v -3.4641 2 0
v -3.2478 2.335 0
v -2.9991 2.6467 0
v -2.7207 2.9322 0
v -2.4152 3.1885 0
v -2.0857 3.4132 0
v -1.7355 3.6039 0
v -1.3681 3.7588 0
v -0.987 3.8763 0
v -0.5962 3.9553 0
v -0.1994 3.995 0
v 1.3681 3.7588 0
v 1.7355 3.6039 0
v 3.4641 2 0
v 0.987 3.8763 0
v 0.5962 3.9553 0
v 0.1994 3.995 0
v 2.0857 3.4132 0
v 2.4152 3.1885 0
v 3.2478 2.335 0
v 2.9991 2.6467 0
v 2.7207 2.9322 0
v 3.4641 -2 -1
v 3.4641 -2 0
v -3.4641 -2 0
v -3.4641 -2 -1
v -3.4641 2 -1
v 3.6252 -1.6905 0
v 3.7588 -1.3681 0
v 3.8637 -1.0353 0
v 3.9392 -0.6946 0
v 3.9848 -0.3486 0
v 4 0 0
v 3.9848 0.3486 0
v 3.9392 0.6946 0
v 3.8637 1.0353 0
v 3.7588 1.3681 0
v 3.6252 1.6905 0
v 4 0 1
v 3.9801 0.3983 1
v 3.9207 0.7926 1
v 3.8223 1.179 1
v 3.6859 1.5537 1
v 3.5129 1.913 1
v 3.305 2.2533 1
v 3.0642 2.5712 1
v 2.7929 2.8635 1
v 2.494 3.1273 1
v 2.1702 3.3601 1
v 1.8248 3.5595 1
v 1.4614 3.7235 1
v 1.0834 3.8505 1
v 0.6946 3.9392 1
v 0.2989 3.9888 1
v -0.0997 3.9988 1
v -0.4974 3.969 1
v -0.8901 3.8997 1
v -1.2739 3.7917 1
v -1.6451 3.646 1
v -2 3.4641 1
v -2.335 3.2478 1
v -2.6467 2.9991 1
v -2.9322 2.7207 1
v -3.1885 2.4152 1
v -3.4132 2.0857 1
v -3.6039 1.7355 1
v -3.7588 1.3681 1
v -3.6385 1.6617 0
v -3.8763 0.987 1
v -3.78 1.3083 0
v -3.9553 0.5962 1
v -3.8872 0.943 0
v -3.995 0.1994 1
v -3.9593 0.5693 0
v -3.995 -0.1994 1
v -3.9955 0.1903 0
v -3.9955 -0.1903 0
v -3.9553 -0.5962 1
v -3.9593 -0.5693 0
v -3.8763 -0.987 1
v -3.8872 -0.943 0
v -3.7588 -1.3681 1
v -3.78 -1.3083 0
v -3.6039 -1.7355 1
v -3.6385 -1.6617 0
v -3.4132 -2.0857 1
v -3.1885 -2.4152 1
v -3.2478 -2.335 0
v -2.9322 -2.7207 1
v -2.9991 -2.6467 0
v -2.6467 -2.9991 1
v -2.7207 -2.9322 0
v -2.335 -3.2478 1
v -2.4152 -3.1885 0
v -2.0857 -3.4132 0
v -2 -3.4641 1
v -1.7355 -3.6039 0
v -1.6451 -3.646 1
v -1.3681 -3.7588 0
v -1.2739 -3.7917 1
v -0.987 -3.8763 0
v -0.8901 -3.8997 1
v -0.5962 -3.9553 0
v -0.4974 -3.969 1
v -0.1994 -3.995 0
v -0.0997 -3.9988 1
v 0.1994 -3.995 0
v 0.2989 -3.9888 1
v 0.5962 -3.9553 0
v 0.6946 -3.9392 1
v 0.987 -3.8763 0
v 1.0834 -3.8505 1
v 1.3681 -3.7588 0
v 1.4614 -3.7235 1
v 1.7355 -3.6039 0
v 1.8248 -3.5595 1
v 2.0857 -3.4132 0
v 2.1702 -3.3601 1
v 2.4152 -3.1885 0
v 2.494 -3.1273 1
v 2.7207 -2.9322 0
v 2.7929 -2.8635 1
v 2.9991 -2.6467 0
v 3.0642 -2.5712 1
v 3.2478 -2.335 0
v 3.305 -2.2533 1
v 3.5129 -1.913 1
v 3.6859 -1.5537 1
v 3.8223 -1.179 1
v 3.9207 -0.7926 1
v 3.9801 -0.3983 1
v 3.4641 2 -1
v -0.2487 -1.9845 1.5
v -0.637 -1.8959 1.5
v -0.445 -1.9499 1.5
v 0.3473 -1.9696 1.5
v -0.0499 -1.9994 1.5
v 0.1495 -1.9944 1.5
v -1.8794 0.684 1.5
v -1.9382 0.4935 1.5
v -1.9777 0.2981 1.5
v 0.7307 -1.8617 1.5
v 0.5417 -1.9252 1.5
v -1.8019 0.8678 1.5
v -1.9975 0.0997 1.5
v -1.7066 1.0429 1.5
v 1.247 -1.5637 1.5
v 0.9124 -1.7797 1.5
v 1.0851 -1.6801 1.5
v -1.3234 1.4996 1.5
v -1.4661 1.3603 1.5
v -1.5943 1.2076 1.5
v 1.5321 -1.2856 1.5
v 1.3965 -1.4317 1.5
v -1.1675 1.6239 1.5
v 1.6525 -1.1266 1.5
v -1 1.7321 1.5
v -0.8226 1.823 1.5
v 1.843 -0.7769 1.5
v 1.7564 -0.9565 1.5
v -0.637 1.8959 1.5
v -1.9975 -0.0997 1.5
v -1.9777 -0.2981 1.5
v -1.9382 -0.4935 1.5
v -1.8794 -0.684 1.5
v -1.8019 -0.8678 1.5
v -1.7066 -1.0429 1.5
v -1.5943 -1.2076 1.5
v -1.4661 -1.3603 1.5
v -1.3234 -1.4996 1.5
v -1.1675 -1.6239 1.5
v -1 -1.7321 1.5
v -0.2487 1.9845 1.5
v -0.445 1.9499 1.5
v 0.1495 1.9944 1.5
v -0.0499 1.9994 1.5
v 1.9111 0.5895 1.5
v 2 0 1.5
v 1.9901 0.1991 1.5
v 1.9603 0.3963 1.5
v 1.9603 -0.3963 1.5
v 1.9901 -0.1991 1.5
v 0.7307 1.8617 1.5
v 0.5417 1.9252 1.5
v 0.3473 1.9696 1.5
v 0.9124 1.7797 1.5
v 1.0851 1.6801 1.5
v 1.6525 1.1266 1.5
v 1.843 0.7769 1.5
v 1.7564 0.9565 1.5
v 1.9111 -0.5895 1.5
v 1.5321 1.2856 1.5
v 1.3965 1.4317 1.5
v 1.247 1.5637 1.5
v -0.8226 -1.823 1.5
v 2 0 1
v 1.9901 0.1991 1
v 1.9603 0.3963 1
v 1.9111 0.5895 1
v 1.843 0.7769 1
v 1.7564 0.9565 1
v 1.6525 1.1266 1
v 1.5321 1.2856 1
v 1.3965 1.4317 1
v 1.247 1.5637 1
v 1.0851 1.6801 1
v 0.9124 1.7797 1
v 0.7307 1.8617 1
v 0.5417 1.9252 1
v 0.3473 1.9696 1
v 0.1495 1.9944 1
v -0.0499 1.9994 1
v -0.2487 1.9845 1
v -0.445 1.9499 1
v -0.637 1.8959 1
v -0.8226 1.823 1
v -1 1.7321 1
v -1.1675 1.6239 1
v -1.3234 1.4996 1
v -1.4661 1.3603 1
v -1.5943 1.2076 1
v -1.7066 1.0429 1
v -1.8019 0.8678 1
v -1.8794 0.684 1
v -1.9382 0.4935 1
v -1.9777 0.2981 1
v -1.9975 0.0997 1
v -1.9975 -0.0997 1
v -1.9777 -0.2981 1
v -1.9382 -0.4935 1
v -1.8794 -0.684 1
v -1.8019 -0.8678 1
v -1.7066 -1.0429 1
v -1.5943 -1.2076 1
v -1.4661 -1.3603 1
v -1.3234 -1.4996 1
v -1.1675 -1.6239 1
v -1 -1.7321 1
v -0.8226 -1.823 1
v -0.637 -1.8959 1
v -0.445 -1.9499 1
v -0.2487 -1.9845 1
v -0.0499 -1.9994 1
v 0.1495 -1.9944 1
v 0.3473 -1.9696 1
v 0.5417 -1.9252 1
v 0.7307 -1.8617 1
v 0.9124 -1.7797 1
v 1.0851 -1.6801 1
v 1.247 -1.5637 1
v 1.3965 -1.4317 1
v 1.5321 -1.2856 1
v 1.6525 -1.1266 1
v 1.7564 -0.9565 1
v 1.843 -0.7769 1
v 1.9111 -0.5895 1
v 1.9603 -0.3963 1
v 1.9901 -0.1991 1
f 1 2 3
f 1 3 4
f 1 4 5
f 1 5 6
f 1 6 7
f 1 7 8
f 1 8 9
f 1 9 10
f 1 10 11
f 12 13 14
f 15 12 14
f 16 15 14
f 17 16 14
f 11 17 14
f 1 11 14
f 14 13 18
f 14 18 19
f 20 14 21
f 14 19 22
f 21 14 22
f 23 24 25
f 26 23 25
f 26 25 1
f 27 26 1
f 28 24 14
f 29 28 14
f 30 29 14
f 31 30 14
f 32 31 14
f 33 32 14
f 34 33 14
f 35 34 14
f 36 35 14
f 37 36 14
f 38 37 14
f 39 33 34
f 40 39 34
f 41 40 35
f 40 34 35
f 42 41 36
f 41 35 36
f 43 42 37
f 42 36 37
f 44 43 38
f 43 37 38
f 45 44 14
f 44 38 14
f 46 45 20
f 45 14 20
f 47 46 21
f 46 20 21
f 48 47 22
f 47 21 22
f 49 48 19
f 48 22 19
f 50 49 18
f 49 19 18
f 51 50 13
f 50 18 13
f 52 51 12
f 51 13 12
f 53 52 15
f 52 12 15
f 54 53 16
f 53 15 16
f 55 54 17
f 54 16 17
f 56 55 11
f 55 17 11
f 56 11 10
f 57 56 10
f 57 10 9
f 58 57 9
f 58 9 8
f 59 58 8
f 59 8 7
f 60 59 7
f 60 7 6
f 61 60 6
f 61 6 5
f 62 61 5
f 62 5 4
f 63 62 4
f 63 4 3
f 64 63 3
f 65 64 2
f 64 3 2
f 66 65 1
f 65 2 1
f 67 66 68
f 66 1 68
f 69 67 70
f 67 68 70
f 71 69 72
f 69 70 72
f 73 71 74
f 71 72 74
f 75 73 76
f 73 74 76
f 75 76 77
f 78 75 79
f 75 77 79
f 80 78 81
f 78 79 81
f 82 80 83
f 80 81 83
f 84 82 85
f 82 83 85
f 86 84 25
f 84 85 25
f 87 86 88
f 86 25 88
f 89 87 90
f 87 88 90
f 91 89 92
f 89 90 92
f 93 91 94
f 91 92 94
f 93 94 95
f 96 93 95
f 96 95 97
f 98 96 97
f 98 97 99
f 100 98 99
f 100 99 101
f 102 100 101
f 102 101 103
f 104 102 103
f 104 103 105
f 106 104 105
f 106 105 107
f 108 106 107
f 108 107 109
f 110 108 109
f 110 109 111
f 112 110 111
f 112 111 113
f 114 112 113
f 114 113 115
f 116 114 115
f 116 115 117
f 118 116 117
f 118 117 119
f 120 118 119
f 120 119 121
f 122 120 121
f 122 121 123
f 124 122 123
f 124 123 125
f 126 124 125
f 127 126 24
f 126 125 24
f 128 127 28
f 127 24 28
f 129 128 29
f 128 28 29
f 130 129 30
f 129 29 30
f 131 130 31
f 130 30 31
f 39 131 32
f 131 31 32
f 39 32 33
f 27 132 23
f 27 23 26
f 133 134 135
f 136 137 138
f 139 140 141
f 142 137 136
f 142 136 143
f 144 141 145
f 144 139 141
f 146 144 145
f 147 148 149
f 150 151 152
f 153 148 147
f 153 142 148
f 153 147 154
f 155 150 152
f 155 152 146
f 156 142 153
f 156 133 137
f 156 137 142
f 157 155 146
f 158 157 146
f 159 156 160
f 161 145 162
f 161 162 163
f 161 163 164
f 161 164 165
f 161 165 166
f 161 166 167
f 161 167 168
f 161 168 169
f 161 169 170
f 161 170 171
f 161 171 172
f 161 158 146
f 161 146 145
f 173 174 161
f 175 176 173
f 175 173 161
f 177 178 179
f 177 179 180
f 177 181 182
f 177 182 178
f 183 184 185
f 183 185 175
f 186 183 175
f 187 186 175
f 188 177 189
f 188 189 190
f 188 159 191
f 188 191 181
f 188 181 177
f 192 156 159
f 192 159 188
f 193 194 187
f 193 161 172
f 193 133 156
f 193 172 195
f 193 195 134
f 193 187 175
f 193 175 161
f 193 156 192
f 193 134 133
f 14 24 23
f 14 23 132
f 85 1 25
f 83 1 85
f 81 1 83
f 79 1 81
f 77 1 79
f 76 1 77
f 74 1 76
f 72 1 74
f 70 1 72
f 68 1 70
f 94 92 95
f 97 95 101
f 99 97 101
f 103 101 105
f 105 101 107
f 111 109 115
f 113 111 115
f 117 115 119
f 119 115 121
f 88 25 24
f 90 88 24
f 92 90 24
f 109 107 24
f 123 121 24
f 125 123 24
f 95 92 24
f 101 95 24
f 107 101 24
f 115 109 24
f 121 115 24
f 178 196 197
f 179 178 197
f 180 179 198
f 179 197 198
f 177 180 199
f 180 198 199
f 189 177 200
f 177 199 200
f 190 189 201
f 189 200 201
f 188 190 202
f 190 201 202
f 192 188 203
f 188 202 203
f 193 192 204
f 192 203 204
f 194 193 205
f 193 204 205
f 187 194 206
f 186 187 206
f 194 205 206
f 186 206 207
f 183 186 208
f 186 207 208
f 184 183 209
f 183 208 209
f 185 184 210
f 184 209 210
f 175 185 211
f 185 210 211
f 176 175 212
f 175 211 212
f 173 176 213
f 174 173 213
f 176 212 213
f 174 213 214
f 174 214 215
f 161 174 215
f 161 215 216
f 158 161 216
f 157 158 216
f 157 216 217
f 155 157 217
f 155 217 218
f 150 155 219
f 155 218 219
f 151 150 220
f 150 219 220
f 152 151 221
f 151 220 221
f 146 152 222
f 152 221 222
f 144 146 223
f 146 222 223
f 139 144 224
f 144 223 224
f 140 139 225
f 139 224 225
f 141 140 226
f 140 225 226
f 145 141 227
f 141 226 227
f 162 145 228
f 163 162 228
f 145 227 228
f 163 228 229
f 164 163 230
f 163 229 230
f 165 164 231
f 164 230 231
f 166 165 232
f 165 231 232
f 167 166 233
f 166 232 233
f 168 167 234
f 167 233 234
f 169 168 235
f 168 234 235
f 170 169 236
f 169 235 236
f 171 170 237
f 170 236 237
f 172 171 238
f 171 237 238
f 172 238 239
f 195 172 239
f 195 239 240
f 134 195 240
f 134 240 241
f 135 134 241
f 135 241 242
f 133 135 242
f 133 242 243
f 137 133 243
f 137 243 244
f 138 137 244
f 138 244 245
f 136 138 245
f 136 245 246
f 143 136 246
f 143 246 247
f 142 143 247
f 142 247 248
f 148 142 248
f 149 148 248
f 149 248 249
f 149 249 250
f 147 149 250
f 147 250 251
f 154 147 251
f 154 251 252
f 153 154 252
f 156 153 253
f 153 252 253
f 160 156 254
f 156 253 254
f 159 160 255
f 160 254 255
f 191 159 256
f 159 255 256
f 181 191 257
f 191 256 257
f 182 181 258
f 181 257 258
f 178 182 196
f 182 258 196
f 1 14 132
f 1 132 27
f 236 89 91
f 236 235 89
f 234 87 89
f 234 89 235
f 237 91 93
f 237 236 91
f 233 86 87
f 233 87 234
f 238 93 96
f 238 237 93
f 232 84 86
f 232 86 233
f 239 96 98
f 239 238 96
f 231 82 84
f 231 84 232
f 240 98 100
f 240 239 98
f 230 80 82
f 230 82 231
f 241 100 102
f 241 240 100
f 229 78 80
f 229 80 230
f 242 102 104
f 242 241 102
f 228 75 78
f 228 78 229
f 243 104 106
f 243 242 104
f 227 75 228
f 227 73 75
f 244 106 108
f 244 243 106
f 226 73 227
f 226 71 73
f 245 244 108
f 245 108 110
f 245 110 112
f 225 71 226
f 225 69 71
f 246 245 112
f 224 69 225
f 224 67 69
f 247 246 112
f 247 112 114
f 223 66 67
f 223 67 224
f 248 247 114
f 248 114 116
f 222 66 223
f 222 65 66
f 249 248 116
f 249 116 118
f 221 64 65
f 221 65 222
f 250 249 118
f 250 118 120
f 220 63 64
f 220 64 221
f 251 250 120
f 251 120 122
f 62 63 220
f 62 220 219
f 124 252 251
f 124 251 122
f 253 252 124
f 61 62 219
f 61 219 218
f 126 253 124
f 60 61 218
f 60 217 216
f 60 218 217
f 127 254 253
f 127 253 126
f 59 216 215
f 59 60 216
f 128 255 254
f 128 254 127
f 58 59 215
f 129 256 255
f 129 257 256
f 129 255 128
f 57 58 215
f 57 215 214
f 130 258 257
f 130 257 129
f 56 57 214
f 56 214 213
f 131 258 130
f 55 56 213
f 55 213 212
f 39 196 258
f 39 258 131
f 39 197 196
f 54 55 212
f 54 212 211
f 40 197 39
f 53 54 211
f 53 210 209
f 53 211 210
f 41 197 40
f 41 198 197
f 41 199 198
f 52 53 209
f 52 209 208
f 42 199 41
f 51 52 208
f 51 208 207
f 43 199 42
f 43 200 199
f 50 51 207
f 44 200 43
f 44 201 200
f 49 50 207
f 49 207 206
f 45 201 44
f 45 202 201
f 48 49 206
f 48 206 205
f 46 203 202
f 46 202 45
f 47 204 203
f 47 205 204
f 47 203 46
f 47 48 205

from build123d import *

# Parameters (mm, degrees)
ESBO_O1_R                = 4
RESSALTO_EXTRUS_O1_DEPTH = 1
ESBO_O2_R                = 2
RESSALTO_EXTRUS_O2_DEPTH = 0.5
ESBO_O3_W                = 6.92820323
ESBO_O3_H                = 4
RESSALTO_EXTRUS_O3_DEPTH = 1


with BuildPart() as part:
    # Esboço1 → Ressalto-extrusão1 (new body)
    with BuildSketch(Plane.XY):
        Circle(ESBO_O1_R)
    extrude(amount=RESSALTO_EXTRUS_O1_DEPTH)

    # Esboço2 → Ressalto-extrusão2 (add)
    with BuildSketch(Plane.XY.offset(1)):
        Circle(ESBO_O2_R)
    extrude(amount=RESSALTO_EXTRUS_O2_DEPTH)

    # Esboço3 → Ressalto-extrusão3 (add)
    with BuildSketch(Plane(origin=(0, 0, 0), x_dir=(-1, 0, 0), z_dir=(0, 0, -1))):
        Rectangle(ESBO_O3_W, ESBO_O3_H)
    extrude(amount=RESSALTO_EXTRUS_O3_DEPTH)


solid = part.part
